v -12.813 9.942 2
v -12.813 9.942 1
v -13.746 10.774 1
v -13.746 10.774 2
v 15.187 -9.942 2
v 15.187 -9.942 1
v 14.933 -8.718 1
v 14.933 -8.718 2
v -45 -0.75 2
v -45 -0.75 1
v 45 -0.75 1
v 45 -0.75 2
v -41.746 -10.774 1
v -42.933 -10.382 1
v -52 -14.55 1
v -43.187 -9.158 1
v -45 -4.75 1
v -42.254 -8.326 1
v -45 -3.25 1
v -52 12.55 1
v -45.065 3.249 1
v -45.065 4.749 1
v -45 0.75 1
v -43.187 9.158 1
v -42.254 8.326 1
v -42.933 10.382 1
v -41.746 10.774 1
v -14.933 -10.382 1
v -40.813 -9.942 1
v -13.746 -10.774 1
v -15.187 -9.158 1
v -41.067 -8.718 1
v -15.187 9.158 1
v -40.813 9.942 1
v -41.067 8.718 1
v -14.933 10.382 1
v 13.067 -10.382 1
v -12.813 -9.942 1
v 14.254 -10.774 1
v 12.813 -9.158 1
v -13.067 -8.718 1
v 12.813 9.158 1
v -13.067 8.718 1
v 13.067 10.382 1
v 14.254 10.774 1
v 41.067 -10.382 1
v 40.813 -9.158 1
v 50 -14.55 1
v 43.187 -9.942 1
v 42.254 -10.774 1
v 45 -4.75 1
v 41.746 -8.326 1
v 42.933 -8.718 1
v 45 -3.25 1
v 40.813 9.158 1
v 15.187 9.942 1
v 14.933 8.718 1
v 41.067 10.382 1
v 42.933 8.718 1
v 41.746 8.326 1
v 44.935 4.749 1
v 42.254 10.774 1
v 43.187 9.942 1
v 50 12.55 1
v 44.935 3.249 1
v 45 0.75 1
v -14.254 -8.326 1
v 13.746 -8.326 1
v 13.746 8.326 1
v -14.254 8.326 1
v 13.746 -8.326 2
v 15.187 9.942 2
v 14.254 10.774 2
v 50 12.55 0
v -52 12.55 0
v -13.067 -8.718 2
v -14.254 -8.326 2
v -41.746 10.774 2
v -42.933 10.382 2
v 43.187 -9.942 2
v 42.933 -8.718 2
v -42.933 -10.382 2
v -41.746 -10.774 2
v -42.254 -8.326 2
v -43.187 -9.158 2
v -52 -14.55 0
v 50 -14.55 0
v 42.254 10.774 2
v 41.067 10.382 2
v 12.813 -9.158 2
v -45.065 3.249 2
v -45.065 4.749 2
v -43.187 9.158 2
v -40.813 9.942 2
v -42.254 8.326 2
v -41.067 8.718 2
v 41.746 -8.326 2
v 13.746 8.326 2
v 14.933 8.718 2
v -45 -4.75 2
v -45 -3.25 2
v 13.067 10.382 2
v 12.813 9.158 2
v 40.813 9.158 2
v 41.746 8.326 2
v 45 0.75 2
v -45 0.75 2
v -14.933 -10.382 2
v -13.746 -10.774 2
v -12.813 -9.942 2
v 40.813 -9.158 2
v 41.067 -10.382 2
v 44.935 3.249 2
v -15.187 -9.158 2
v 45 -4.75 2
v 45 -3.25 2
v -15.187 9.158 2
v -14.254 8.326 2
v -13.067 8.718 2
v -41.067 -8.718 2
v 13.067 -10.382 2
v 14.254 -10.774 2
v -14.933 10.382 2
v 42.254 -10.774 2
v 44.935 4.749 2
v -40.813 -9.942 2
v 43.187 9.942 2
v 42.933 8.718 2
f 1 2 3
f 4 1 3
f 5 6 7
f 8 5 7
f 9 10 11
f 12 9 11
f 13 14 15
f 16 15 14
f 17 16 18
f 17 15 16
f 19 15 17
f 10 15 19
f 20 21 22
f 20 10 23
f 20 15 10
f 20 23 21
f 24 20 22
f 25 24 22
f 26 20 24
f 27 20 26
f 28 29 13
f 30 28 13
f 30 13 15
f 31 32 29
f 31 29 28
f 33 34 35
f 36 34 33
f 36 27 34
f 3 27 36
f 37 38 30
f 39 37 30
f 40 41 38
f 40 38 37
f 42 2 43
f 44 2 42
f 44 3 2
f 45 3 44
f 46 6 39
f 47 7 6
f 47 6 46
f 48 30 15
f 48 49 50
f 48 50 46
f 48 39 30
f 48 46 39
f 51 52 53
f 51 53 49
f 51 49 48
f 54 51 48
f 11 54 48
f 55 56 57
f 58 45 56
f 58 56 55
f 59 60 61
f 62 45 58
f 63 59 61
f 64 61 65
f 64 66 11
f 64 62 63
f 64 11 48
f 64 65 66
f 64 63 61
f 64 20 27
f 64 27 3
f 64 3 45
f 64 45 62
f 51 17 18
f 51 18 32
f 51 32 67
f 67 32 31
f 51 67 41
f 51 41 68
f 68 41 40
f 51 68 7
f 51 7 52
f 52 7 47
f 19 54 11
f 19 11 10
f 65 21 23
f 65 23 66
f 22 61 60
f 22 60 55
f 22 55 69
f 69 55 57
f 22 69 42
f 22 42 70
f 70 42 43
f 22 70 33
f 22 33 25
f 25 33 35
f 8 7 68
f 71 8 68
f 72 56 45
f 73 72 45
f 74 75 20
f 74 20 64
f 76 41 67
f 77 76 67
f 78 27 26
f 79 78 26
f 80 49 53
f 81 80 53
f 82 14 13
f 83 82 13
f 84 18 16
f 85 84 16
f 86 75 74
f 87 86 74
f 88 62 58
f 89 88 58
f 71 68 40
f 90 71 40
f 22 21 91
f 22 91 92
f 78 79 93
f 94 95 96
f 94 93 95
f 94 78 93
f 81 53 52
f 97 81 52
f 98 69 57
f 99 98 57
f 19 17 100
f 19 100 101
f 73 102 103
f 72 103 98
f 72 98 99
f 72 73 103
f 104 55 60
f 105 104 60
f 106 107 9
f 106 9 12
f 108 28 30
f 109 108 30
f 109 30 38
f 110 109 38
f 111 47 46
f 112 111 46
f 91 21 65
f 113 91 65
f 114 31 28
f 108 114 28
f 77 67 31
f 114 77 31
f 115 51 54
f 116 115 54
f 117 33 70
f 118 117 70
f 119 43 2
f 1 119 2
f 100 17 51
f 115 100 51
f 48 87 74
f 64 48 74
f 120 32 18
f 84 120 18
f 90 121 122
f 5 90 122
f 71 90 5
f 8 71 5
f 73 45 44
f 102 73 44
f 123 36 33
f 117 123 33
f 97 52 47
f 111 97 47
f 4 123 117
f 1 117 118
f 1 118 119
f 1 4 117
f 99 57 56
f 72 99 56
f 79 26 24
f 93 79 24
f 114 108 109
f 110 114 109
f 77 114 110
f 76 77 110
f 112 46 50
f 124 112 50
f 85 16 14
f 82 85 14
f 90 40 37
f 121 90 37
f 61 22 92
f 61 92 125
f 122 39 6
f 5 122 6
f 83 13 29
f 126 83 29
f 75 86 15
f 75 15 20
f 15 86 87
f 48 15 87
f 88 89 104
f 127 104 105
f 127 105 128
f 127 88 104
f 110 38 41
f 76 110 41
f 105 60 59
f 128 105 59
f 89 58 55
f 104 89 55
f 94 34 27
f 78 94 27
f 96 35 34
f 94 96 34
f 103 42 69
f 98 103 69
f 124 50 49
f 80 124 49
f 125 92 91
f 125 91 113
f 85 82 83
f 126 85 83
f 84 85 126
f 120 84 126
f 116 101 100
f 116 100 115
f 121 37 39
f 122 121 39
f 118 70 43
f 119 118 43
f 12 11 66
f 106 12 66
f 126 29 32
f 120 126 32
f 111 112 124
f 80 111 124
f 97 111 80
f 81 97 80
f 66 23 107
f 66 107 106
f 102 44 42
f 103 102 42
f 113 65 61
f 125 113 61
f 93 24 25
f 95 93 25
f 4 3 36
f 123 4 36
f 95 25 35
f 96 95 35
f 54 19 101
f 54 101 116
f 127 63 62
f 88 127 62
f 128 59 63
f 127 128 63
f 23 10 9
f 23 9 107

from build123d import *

# Parameters (mm, degrees)
F0_W     = 102
F0_H     = 27.1
F1_DEPTH = 1
F2_W     = 90
F2_H     = 1.5
F3_DEPTH = 1


# Not quite as in the source:
# - a feature names something its author has since deleted; it is built from what else it names


with BuildPart() as f1:
    # F0 (on Top) → F1 (new body)
    with BuildSketch(Plane.XY):
        with Locations((-1, -1)):
            Rectangle(F0_W, F0_H)
    extrude(amount=F1_DEPTH)

    # F2 (on face) → F3 (join)
    with BuildSketch(Plane.XY.offset(1)):
        Polygon((-42.2541592645, 8.3261114968), (-41.0671610971, 8.7179473687), (-40.8130018326, 9.9418358719), (-41.7458407355, 10.7738885032), (-42.9328389029, 10.3820526313), (-43.1869981674, 9.1581641281), align=None)
        Polygon((-13.0671610971, 8.7179473687), (-12.8130018326, 9.9418358719), (-13.7458407355, 10.7738885032), (-14.9328389029, 10.3820526313), (-15.1869981674, 9.1581641281), (-14.2541592645, 8.3261114968), align=None)
        Polygon((14.9328389029, 8.7179473687), (15.1869981674, 9.9418358719), (14.2541592645, 10.7738885032), (13.0671610971, 10.3820526313), (12.8130018326, 9.1581641281), (13.7458407355, 8.3261114968), align=None)
        Polygon((42.9328389029, 8.7179473687), (43.1869981674, 9.9418358719), (42.2541592645, 10.7738885032), (41.0671610971, 10.3820526313), (40.8130018326, 9.1581641281), (41.7458407355, 8.3261114968), align=None)
        Polygon((-43.1869981674, -9.1581641281), (-42.9328389029, -10.3820526313), (-41.7458407355, -10.7738885032), (-40.8130018326, -9.9418358719), (-41.0671610971, -8.7179473687), (-42.2541592645, -8.3261114968), align=None)
        Polygon((-14.2541592645, -8.3261114968), (-15.1869981674, -9.1581641281), (-14.9328389029, -10.3820526313), (-13.7458407355, -10.7738885032), (-12.8130018326, -9.9418358719), (-13.0671610971, -8.7179473687), align=None)
        Polygon((13.7458407355, -8.3261114968), (12.8130018326, -9.1581641281), (13.0671610971, -10.3820526313), (14.2541592645, -10.7738885032), (15.1869981674, -9.9418358719), (14.9328389029, -8.7179473687), align=None)
        Polygon((42.9328389029, -8.7179473687), (41.7458407355, -8.3261114968), (40.8130018326, -9.1581641281), (41.0671610971, -10.3820526313), (42.2541592645, -10.7738885032), (43.1869981674, -9.9418358719), align=None)
        with Locations((-0.065032054, 3.9994713191)):
            Rectangle(F2_W, F2_H)
        Rectangle(F2_W, F2_H)
        with Locations((0, -4)):
            Rectangle(F2_W, F2_H)
    extrude(amount=F3_DEPTH)


solid = f1.part
